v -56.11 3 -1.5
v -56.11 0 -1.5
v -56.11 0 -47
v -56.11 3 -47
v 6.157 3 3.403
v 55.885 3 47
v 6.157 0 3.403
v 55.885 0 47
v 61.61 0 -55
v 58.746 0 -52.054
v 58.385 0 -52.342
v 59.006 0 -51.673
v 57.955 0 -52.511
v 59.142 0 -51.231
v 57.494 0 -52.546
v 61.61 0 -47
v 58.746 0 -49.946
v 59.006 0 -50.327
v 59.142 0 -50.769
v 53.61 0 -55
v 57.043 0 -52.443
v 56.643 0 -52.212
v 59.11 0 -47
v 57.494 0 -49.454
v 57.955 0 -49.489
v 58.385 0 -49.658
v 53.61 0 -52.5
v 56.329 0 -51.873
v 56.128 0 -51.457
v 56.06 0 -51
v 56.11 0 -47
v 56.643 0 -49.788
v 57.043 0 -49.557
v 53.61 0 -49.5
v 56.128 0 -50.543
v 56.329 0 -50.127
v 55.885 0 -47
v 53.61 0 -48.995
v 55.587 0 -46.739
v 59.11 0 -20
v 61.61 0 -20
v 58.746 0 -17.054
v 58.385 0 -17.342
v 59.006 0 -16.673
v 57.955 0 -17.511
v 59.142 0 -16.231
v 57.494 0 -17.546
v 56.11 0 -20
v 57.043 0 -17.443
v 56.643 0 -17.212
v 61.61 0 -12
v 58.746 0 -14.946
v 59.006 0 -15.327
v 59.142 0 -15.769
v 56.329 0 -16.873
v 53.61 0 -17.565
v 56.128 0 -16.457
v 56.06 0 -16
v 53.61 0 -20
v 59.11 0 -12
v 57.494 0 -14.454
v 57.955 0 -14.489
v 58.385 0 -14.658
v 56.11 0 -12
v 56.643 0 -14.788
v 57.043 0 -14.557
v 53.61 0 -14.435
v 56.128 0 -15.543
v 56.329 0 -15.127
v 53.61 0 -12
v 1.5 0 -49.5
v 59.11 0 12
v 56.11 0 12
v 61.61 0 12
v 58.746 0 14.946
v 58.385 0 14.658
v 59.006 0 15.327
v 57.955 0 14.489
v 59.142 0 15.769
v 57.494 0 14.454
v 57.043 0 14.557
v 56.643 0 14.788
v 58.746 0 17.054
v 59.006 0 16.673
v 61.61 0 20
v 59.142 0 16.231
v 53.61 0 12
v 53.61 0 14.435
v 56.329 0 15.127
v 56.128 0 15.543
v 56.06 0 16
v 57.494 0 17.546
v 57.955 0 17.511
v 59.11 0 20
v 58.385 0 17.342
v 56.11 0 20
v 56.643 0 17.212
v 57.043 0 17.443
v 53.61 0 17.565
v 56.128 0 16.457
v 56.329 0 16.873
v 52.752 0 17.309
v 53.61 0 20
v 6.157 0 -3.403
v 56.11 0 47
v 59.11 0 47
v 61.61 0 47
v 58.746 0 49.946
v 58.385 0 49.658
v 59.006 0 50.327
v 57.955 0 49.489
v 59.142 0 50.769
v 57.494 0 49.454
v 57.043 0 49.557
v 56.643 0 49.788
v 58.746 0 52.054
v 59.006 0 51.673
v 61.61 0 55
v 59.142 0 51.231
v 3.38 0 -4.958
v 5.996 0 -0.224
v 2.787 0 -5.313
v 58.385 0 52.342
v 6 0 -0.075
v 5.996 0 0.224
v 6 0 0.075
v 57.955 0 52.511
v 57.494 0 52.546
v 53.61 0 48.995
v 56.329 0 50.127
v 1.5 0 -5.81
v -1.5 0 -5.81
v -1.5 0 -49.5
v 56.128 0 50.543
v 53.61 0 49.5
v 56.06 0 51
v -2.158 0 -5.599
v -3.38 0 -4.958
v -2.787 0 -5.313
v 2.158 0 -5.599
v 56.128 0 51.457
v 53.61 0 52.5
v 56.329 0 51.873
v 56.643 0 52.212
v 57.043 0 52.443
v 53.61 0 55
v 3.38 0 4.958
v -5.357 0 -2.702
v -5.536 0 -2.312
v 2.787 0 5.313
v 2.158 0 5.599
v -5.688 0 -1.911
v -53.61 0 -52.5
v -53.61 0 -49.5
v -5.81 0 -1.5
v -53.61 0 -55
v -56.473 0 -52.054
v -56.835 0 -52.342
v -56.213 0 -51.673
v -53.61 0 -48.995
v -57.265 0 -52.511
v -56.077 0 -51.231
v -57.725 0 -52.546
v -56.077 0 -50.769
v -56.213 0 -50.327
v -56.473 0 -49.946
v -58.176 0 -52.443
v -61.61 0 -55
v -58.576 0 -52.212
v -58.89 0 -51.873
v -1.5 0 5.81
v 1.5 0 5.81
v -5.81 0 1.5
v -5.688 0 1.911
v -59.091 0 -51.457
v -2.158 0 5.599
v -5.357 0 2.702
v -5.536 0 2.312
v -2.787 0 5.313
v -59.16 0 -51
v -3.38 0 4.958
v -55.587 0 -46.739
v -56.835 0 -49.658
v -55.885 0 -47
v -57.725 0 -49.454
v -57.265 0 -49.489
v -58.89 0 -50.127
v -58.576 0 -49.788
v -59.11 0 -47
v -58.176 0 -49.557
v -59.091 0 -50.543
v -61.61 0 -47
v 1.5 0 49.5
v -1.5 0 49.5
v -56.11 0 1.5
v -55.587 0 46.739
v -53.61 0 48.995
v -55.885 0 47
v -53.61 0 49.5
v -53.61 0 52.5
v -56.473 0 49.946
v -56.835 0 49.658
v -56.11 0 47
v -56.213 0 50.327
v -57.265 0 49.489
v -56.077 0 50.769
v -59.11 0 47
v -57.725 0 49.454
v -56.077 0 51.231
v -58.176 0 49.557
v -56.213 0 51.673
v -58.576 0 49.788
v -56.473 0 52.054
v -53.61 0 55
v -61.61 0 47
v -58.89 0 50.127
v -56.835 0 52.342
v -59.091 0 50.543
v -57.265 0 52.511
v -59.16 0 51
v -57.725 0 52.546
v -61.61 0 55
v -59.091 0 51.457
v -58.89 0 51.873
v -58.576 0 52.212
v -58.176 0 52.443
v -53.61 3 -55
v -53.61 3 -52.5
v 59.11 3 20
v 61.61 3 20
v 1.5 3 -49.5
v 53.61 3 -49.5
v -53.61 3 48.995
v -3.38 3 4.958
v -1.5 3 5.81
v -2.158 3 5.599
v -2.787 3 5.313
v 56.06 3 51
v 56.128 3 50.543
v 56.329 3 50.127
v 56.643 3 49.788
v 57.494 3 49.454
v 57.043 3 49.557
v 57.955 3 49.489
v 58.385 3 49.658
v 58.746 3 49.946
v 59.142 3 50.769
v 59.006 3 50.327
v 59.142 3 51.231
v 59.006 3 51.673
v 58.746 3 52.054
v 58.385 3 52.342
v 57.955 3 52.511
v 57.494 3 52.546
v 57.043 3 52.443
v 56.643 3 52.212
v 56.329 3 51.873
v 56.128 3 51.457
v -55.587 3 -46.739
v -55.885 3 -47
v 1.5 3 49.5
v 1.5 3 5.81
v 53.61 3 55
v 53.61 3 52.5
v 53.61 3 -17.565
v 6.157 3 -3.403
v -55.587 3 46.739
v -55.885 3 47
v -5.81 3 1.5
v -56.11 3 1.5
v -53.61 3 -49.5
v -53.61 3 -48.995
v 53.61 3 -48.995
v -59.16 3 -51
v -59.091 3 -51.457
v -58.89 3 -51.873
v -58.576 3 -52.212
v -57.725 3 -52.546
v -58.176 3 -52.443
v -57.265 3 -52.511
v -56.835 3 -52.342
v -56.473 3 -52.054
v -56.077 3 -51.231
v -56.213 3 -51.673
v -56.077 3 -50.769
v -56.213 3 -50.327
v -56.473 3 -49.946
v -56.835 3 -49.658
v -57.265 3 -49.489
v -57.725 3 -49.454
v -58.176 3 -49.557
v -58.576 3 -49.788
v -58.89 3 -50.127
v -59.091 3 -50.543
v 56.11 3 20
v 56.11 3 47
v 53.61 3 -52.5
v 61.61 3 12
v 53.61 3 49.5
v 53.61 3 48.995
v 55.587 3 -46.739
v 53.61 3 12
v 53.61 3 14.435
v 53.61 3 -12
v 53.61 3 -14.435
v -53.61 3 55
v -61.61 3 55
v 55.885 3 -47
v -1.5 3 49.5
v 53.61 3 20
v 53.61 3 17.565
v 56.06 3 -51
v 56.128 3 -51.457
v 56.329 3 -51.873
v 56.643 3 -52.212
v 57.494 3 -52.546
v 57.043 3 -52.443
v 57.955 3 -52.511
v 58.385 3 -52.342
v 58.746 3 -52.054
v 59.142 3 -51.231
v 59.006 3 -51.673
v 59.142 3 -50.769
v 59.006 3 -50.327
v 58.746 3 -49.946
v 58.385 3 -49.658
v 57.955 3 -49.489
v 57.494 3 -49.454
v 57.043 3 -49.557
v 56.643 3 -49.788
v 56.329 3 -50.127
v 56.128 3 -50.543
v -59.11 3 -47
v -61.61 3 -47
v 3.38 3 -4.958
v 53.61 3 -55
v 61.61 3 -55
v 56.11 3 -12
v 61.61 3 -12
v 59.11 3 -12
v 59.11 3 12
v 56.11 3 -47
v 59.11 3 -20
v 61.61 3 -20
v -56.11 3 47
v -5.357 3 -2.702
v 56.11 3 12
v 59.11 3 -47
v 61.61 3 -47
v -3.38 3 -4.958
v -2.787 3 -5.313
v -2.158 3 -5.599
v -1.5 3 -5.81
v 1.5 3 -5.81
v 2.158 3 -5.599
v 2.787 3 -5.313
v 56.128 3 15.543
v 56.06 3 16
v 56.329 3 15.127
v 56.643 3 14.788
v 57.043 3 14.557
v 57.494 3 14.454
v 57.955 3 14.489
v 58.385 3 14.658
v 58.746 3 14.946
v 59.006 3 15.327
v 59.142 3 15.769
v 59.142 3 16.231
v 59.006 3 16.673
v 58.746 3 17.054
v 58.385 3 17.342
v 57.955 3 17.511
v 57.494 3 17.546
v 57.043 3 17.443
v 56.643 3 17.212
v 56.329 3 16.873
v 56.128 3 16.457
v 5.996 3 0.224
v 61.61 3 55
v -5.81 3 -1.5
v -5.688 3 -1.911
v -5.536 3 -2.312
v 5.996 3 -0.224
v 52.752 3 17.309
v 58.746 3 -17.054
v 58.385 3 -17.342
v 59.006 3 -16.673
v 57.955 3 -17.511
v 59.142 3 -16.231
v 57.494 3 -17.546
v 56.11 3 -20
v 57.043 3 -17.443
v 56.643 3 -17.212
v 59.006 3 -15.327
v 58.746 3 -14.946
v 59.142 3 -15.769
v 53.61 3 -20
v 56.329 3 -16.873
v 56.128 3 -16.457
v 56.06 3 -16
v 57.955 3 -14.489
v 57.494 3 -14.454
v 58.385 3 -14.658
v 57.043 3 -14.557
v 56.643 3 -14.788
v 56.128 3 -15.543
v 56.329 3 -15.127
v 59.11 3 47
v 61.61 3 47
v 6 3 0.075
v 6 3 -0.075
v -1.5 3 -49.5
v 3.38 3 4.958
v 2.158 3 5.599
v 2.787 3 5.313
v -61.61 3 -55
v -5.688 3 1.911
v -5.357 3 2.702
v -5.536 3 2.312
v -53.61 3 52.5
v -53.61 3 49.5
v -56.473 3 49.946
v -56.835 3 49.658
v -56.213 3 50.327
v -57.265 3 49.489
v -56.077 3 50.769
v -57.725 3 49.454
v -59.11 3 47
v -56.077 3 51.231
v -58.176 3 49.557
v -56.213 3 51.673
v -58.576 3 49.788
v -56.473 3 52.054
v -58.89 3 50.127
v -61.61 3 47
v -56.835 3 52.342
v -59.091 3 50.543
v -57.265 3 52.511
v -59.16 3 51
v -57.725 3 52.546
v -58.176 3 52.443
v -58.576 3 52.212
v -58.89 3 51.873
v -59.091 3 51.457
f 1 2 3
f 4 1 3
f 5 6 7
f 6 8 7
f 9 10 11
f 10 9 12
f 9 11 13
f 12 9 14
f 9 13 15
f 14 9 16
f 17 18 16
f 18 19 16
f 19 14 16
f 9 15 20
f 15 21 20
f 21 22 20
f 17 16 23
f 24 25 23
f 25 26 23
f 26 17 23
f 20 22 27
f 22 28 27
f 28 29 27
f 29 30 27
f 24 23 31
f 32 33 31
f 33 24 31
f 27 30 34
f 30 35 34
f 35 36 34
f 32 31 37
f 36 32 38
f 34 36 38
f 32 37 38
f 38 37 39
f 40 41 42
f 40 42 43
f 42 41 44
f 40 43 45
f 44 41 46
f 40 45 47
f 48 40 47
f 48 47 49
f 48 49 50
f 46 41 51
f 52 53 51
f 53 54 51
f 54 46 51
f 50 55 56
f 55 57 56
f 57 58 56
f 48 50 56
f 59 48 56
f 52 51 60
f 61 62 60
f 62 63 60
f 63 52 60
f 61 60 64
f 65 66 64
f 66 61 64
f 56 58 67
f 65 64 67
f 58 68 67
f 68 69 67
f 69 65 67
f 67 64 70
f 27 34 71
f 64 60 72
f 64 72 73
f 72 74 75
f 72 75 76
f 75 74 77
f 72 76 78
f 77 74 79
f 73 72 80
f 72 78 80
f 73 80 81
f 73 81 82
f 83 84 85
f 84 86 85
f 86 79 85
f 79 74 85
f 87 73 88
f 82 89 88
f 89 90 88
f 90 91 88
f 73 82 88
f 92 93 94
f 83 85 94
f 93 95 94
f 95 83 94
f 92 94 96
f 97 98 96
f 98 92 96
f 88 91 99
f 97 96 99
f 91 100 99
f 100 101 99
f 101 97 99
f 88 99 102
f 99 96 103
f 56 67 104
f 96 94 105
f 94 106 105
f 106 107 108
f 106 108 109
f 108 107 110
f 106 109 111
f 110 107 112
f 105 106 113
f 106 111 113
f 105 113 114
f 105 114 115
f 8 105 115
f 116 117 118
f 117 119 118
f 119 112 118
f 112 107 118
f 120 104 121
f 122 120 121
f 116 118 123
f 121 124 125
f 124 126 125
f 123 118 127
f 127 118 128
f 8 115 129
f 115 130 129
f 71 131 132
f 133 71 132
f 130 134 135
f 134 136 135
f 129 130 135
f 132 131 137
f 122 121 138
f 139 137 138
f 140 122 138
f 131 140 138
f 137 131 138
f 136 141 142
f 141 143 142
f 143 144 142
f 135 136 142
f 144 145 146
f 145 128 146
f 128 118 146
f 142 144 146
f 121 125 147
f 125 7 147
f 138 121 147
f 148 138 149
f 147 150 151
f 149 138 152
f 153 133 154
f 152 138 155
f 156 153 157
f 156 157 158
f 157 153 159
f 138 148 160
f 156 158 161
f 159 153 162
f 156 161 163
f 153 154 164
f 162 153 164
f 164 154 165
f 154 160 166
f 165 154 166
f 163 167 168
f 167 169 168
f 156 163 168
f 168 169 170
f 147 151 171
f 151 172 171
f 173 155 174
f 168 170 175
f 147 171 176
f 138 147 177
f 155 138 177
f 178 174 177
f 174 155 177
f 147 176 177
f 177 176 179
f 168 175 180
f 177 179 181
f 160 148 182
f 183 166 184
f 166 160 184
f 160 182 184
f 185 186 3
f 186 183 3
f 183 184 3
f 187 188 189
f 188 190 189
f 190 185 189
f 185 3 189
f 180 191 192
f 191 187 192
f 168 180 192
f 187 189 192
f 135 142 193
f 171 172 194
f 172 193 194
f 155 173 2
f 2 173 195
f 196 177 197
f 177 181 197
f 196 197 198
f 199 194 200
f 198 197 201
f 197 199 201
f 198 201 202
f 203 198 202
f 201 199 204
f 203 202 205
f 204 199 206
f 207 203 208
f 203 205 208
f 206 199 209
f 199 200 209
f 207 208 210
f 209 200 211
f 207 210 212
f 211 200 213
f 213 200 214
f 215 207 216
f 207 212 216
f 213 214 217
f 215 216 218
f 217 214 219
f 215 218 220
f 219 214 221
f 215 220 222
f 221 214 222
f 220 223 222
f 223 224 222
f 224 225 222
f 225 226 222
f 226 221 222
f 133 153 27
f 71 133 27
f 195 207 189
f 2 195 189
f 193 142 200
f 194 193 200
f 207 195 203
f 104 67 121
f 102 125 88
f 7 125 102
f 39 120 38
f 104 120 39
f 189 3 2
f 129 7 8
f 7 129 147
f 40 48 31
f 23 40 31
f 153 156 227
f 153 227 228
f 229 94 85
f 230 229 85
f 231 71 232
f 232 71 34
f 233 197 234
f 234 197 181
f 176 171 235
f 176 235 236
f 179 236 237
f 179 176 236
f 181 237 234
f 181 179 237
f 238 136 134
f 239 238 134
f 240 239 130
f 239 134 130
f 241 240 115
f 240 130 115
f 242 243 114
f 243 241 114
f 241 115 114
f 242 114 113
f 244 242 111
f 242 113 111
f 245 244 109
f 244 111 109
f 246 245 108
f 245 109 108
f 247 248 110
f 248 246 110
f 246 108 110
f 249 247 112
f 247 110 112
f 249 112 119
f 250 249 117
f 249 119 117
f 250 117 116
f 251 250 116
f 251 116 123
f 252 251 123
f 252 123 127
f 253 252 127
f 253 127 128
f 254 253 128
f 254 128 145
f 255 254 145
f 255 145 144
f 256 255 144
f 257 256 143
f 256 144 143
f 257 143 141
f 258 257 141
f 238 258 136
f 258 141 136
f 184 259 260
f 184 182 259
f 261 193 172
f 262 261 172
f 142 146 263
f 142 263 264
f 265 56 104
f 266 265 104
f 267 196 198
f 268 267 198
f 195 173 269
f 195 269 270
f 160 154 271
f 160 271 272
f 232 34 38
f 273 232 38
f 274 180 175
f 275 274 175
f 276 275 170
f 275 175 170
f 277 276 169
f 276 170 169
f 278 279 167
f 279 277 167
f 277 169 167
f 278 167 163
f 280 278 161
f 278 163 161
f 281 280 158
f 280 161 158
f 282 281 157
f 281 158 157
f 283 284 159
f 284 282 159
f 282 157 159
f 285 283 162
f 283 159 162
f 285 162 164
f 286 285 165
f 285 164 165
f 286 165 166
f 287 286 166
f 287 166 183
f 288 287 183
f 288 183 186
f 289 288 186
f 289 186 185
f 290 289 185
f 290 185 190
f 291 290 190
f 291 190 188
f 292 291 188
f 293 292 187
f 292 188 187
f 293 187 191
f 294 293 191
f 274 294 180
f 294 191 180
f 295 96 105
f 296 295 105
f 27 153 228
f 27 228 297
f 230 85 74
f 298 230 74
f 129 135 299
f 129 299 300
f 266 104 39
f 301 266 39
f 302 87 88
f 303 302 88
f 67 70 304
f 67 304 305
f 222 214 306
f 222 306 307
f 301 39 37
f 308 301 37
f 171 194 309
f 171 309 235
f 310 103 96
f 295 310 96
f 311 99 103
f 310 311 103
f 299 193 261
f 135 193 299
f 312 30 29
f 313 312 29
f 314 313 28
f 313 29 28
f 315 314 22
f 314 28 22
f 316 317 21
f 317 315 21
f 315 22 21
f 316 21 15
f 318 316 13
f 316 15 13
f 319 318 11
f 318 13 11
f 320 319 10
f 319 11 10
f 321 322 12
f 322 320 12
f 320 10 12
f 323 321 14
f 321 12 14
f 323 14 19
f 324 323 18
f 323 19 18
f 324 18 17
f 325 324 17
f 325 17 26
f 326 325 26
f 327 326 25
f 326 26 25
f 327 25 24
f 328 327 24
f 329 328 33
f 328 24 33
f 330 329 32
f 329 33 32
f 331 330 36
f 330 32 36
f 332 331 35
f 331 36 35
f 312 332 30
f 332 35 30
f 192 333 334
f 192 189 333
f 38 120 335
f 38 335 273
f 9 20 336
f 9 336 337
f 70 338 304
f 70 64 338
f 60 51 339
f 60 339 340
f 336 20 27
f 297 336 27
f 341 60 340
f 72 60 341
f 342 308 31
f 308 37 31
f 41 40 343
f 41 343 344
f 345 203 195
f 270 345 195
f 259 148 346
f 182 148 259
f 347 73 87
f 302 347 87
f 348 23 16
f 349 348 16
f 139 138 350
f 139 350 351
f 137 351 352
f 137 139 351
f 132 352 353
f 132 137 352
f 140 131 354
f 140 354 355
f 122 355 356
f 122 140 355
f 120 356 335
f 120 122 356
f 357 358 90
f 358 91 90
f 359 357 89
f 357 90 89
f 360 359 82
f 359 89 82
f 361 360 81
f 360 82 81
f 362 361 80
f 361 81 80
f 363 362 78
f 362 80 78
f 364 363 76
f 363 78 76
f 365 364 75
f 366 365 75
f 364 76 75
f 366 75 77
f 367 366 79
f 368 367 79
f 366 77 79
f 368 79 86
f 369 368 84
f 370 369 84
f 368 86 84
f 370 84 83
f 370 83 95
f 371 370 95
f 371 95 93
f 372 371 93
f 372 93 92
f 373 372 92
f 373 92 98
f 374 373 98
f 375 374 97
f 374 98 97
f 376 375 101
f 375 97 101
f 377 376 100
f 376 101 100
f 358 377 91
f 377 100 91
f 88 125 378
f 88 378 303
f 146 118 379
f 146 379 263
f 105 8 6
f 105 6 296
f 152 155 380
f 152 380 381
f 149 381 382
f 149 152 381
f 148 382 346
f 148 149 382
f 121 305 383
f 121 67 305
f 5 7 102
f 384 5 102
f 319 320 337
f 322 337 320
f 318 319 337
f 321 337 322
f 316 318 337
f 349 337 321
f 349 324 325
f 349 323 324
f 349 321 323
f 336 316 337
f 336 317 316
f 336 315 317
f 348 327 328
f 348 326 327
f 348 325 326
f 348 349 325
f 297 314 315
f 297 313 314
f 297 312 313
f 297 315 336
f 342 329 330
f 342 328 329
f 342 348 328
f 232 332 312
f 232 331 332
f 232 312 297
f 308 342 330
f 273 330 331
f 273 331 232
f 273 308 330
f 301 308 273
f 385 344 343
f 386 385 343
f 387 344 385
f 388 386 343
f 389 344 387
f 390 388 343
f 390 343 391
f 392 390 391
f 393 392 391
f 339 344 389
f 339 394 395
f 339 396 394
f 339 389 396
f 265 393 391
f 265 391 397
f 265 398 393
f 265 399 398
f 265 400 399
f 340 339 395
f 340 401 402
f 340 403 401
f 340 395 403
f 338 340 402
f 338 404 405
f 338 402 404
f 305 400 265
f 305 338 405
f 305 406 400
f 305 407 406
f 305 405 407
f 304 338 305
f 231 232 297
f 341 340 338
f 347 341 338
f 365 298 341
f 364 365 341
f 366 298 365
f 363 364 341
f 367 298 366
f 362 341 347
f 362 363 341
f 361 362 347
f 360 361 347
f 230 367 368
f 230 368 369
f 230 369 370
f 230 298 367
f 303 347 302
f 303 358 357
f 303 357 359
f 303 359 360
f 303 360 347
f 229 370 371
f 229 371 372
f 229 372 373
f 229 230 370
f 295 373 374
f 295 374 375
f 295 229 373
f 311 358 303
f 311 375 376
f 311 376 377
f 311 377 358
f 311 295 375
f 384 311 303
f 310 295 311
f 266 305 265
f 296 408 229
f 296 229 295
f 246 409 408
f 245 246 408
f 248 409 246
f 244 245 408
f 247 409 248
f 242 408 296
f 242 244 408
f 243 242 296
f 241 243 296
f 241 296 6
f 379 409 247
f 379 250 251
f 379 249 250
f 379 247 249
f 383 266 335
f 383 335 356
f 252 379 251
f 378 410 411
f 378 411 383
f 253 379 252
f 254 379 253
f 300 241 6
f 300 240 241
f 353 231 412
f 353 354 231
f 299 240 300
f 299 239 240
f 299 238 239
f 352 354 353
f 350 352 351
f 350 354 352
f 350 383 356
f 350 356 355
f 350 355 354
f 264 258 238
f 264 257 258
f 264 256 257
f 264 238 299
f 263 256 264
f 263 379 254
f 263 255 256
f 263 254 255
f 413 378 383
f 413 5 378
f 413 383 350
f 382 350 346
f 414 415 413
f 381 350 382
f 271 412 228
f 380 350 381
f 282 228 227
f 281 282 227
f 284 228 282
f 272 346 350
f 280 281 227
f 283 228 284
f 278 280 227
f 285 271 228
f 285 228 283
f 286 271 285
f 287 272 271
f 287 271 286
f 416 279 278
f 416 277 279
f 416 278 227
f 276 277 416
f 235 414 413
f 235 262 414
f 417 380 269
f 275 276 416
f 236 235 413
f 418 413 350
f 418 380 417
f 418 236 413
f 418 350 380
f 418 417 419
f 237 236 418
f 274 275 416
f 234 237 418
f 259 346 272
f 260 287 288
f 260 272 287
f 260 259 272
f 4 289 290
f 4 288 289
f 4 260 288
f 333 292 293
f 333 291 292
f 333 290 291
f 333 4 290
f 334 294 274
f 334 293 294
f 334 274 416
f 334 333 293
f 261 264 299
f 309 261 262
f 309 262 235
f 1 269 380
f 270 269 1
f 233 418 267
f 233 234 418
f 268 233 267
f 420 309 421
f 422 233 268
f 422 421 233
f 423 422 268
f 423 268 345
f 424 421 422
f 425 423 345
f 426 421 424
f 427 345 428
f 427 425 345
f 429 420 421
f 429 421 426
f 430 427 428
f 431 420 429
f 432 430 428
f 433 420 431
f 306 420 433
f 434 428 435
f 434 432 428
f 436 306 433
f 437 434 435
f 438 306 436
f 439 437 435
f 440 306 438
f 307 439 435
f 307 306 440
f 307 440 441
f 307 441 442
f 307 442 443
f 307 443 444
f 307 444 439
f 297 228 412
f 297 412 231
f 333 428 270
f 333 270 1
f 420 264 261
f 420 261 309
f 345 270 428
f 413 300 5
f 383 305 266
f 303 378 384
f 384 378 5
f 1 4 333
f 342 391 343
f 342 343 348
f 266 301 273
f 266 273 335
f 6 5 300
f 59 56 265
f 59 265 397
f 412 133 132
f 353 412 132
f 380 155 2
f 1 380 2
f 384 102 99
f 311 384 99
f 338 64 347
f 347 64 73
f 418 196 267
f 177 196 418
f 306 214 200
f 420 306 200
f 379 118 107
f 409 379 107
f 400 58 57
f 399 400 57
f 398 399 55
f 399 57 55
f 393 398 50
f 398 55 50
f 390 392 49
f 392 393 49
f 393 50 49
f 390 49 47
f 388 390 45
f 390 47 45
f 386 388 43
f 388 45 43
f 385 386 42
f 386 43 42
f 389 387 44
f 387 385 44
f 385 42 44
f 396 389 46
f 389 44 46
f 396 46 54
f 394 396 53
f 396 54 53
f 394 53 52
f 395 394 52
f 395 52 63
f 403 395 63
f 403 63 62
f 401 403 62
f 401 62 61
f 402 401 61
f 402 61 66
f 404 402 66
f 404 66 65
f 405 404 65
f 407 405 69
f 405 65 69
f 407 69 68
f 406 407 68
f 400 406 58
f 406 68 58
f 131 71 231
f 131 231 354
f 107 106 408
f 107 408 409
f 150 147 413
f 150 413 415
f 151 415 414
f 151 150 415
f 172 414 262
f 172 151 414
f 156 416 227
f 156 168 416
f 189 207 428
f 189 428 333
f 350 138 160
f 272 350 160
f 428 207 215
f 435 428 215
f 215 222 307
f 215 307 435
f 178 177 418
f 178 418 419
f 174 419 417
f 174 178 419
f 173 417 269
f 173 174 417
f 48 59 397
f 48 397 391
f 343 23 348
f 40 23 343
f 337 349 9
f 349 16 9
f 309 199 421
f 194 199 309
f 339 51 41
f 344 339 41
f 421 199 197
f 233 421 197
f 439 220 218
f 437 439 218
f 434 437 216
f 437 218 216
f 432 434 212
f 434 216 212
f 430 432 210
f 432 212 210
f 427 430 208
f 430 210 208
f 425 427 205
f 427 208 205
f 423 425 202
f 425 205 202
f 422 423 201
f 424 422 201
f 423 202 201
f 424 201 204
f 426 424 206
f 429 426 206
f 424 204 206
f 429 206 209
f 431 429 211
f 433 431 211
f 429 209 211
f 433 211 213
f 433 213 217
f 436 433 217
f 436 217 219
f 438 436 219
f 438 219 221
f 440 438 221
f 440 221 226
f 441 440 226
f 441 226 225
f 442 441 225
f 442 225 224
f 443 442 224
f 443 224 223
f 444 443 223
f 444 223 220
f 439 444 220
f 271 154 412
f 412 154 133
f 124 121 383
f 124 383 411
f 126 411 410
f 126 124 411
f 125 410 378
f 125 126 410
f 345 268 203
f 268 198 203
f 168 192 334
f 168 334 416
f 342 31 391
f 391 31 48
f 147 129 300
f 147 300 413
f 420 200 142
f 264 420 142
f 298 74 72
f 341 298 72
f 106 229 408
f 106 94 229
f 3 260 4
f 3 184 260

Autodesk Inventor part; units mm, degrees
ref_plane "YZ Plane" through (0, 0, 0) normal (1, 0, 0) x (0, 1, 0)
ref_plane "XZ Plane" through (0, 0, 0) normal (0, 1, 0) x (-1, 0, 0)
ref_plane "XY Plane" through (0, 0, 0) normal (0, 0, 1) x (1, 0, 0)
sketch "Sketch1" plane through (0, 0, 0) normal (0, 1, 0) x (-1, 0, 0)
  line L0 (75, 59) -> (-75, 59)
  line L1 (-75, 59) -> (-75, -59)
  line L2 (-75, -59) -> (75, -59)
  line L3 (75, -59) -> (75, 59)
  line L4 (75, 59) -> (-75, -59) construction
  line L5 (-75, 59) -> (75, -59) construction
  line L6 (62.0096, 59) -> (62.0096, -65)
  line L7 (105, 0) -> (-105, 0) projected
  line L8 (0, -90) -> (0, 85) projected
  line L9 (-62.0096, 59) -> (-62.0096, -65)
  line L10 (61.6096, 59) -> (61.6096, -59)
  line L11 (-61.6096, 59) -> (-61.6096, -59)
  line L12 (-71, 55) -> (71, 55)
  line L13 (71, 55) -> (71, -55)
  line L14 (71, -55) -> (-71, -55)
  line L15 (-71, -55) -> (-71, 55)
  line L16 (61.6096, 55) -> (53.6096, 55)
  line L17 (53.6096, 55) -> (53.6096, 47)
  line L18 (53.6096, 47) -> (61.6096, 47)
  line L19 (61.6096, 47) -> (61.6096, 55)
  line L20 (61.6096, -55) -> (53.6096, -55)
  line L21 (53.6096, -55) -> (53.6096, -47)
  line L22 (53.6096, -47) -> (61.6096, -47)
  line L23 (-61.6096, 55) -> (-53.6096, 55)
  line L24 (-53.6096, 55) -> (-53.6096, 47)
  line L25 (-53.6096, 47) -> (-61.6096, 47)
  line L26 (-61.6096, 47) -> (-61.6096, 55)
  line L27 (-53.6096, -55) -> (-53.6096, -47)
  line L28 (-53.6096, -47) -> (-61.6096, -47)
  line L29 (-61.6096, -55) -> (-53.6096, -55)
  line L30 (-61.6096, 12) -> (-53.6096, 12)
  line L31 (-53.6096, 12) -> (-53.6096, 20)
  line L32 (-53.6096, 20) -> (-61.6096, 20)
  line L33 (-61.6096, 20) -> (-61.6096, 12)
  line L34 (-61.6096, -12) -> (-53.6096, -12)
  line L35 (-53.6096, -12) -> (-53.6096, -20)
  line L36 (-53.6096, -20) -> (-61.6096, -20)
  circle A0 centre (57.6096, 51) radius 1.55
  line L37 (61.6096, 51) -> (53.6096, 51)
  line L38 (57.6096, 55) -> (57.6096, 47)
  circle A1 centre (57.6096, -51) radius 1.55
  circle A2 centre (-57.6096, 51) radius 1.55
  circle A3 centre (-57.6096, -51) radius 1.55
  line L39 (-53.6096, 16) -> (-61.6096, 16)
  line L40 (-57.6096, 20) -> (-57.6096, 12)
  circle A4 centre (-57.6096, 16) radius 1.55
  circle A5 centre (-57.6096, -16) radius 1.55
  line L41 (53.6096, 51) -> (-53.6096, 51)
  line L42 (57.6096, 47) -> (57.6096, -47)
  line L43 (53.6096, -51) -> (-53.6096, -51)
  line L44 (-57.6096, -47) -> (-57.6096, -20)
  line L45 (-57.6096, -12) -> (-57.6096, 12)
  line L46 (-57.6096, 20) -> (-57.6096, 47)
  line L47 (53.6096, 47) -> (-53.6096, -47)
  line L48 (-53.6096, 47) -> (53.6096, -47)
  line L49 (0, 0) -> (57.6096, 0)
  line L50 (0, 0) -> (-57.6096, 0)
  line L51 (0, 0) -> (-53.6096, 16)
  line L52 (0, 0) -> (-53.6096, -16)
  circle A6 centre (0, 0) radius 6
  line L53 (53.6096, 48.9948) -> (3.3795, 4.9577)
  line L54 (53.6096, 52.5) -> (-53.6096, 52.5)
  line L55 (59.1096, 47) -> (59.1096, -47)
  line L56 (53.6096, -52.5) -> (-53.6096, -52.5)
  line L57 (-59.1096, -47) -> (-59.1096, -20)
  line L58 (-59.1096, -12) -> (-59.1096, 12)
  line L59 (-59.1096, 20) -> (-59.1096, 47)
  line L60 (-55.885, 47) -> (-5.3572, 2.7019)
  line L61 (-5.9958, 0.2241) -> (-53.6096, 14.4346)
  line L62 (-53.6096, -17.5654) -> (-5.1378, -3.0988)
  line L63 (-3.3795, -4.9577) -> (-53.6096, -48.9948)
  line L64 (5.8095, -1.5) -> (57.6096, -1.5)
  line L65 (56.1096, 47) -> (56.1096, -47)
  line L66 (53.6096, 49.5) -> (-53.6096, 49.5)
  line L67 (55.5873, 46.739) -> (5.3572, 2.7019)
  line L68 (5.8095, 1.5) -> (57.6096, 1.5)
  line L69 (-53.9073, 49.2558) -> (-3.3795, 4.9577)
  line L70 (-5.1378, 3.0988) -> (-52.7517, 17.3093)
  line L71 (-5.3572, -2.7019) -> (-55.5873, -46.739)
  line L72 (53.6096, -49.5) -> (-53.6096, -49.5)
  line L73 (-56.1096, -47) -> (-56.1096, -20)
  line L74 (-56.1096, -12) -> (-56.1096, 12)
  line L75 (-56.1096, 20) -> (-56.1096, 47)
  line L76 (-54.4676, -14.6907) -> (-5.9958, -0.2241)
  line L77 (3.3795, -4.9577) -> (53.6096, -48.9948)
  line L78 (5.3572, -2.7019) -> (55.5873, -46.739)
  line L79 (1.5, 49.5) -> (1.5, 5.8095)
  line L80 (-1.5, 49.5) -> (-1.5, 5.8095)
  line L81 (1.5, -49.5) -> (1.5, -5.8095)
  line L82 (-1.5, -49.5) -> (-1.5, -5.8095)
  line L83 (-52.7517, 17.3093) -> (-53.6096, 17.5654)
  line L84 (55.5873, -46.739) -> (55.885, -47)
  line L85 (55.5873, 46.739) -> (55.885, 47)
  line L86 (-55.5873, -46.739) -> (-58.8433, -49.5936)
  point P0 (-53.6096, 55)
  point P1 (-61.6096, 55)
  point P2 (-61.6096, 47)
  point P3 (-61.6096, 0)
  point P4 (-71, 0)
  point P5 (53.6096, 55)
  point P6 (4.5116, -3.9554)
  point P7 (56.1096, -1.5)
  point P8 (-4.5116, -3.9554)
  point P9 (-56.1096, -20)
  point P10 (1.5, -49.5)
  point P11 (1.5, -5.8095)
  point P12 (-1.5, -5.8095)
  point P13 (-1.5, -49.5)
  point P14 (-1.5, 5.8095)
  point P15 (-3.3795, 4.9577)
  point P16 (-53.6096, 48.9948)
  point P17 (-1.5, 49.5)
  point P18 (56.1096, 1.5)
  point P19 (4.5116, 3.9554)
  point P20 (-53.6096, -14.4346)
  point P21 (-5.7494, 1.7159)
  point P22 (-61.6096, -47)
  point P23 (-61.6096, -55)
  point P24 (-53.6096, -55)
  point P25 (53.6096, -55)
  point P26 (61.6096, -55)
  point P27 (61.6096, -47)
  point P28 (61.6096, 47)
  point P29 (5.3572, -2.7019)
  point P30 (-55.885, -47)
  point P31 (-6.1568, -3.4029)
  point P32 (5.3572, 2.7019)
  point P33 (-6.1568, 3.4029)
  dimension "d13" = 12
  dimension "d0" = 150
  dimension "d1" = 118
  dimension "d2" = 12.9904
  dimension "d3" = 0.4
  dimension "d4" = 4
  dimension "d5" = 8
  dimension "d6" = 8
  dimension "d7" = 8
  dimension "d8" = 8
  dimension "d9" = 12
  dimension "d10" = 3.1
  dimension "d11" = 3.1
  dimension "d14" = 3
  dimension "d15" = 3
  dimension "d16" = 3
  dimension "d17" = 3
  dimension "d18" = 3
  dimension "d19" = 3
  dimension "d20" = 3
  dimension "d21" = 3
  dimension "d22" = 3
  dimension "d23" = 3
  dimension "d24" = 3
  dimension "d25" = 3
extrude "Extrusion1" add sketch "Sketch1" along normal blind 3 contours L10 L37 A0 L38 L12 | L10 L18 L38 A0 L37 | L38 A0 L37 L17 L12 | L12 L24 L25 L11 | L54 L17 L41 L8 | L8 L41 L24 L54 | L14 L21 L22 L10 | L55 L22 L42 L7 | L7 L42 L18 L55 | L41 L17 L66 L8 | L8 L66 L24 L41 | L38 L18 L17 L37 A0 | L42 L64 L65 L7 | L7 L65 L68 L42 | L32 L40 A4 L39 L11 | L25 L46 L32 L59 | L66 L79 A6 L8 | L8 A6 L80 L66 | L42 L68 L65 L18 | L56 L8 L43 L21 | L65 L64 A6 L7 | L7 A6 L68 L65 | L42 L22 L65 L64 | L11 L28 L27 L14 | L56 L27 L43 L8 | L39 A4 L40 L30 L11 | L25 L75 L32 L46 | A6 L47 L8 | L8 L48 A6 | L43 L8 L72 L21 | A6 L48 L7 | L7 L47 A6 | L43 L27 L72 L8 | L58 L30 L45 L7 | L7 L45 L34 L58 | L34 L35 L36 L11 | L32 L31 L39 A4 L40 | L52 A6 L7 | L48 A6 L8 | L8 A6 L47 | L51 A6 L48 | L7 A6 L51 | L47 A6 L52 | L17 L47 A6 L53 | L69 A6 L48 L24 | L85 L67 A6 L47 L18 | L22 L48 A6 L78 L84 | L57 L36 L44 L28 | L72 L82 A6 L8 | L8 A6 L81 L72 | L45 L30 L74 L7 | L7 L74 L34 L45 | A4 L39 L31 L30 L40 | L25 L48 A6 L70 L60 | A6 L63 L27 L47 | L47 L28 L86 L71 L62 A6 | L48 L21 L77 A6 | A6 L61 L31 L51 | L51 L31 L83 L70 L60 A6 | A6 L71 L62 L35 L52 | L52 L35 L76 A6 | L44 L36 L73 L28 | L70 A6 L60 | L62 L71 A6
equation "\"d0\" = BodyLength"
equation "\"d1\" = BodyWidth"
equation "\"d2\" = 0.433013 * BodyHeight"
equation "\"d4\" = SideThickness"
equation "\"d5\" = M3ScrewInsertBrim"
equation "\"d6\" = M3ScrewInsertBrim"
equation "\"d7\" = M3ScrewInsertBrim"
equation "\"d8\" = M3ScrewInsertBrim"
equation "\"d10\" = M3ScrewDia"
equation "\"d11\" = M3ScrewDia"
equation "\"SideThickness_1\" = 4"
equation "\"M3ScrewInsertBrim_1\" = 8"
equation "\"M3ScrewDia_1\" = 3.1"
equation "\"BodyLength\" = 150"
equation "\"BodyWidth\" = 118"
equation "\"BodyHeight\" = 30"
equation "\"SideThickness\" = 4"
equation "\"M3ScrewInsertBrim\" = 8"
equation "\"M3ScrewDia\" = 3.1"
properties part number "HexScrewGuideV2"
